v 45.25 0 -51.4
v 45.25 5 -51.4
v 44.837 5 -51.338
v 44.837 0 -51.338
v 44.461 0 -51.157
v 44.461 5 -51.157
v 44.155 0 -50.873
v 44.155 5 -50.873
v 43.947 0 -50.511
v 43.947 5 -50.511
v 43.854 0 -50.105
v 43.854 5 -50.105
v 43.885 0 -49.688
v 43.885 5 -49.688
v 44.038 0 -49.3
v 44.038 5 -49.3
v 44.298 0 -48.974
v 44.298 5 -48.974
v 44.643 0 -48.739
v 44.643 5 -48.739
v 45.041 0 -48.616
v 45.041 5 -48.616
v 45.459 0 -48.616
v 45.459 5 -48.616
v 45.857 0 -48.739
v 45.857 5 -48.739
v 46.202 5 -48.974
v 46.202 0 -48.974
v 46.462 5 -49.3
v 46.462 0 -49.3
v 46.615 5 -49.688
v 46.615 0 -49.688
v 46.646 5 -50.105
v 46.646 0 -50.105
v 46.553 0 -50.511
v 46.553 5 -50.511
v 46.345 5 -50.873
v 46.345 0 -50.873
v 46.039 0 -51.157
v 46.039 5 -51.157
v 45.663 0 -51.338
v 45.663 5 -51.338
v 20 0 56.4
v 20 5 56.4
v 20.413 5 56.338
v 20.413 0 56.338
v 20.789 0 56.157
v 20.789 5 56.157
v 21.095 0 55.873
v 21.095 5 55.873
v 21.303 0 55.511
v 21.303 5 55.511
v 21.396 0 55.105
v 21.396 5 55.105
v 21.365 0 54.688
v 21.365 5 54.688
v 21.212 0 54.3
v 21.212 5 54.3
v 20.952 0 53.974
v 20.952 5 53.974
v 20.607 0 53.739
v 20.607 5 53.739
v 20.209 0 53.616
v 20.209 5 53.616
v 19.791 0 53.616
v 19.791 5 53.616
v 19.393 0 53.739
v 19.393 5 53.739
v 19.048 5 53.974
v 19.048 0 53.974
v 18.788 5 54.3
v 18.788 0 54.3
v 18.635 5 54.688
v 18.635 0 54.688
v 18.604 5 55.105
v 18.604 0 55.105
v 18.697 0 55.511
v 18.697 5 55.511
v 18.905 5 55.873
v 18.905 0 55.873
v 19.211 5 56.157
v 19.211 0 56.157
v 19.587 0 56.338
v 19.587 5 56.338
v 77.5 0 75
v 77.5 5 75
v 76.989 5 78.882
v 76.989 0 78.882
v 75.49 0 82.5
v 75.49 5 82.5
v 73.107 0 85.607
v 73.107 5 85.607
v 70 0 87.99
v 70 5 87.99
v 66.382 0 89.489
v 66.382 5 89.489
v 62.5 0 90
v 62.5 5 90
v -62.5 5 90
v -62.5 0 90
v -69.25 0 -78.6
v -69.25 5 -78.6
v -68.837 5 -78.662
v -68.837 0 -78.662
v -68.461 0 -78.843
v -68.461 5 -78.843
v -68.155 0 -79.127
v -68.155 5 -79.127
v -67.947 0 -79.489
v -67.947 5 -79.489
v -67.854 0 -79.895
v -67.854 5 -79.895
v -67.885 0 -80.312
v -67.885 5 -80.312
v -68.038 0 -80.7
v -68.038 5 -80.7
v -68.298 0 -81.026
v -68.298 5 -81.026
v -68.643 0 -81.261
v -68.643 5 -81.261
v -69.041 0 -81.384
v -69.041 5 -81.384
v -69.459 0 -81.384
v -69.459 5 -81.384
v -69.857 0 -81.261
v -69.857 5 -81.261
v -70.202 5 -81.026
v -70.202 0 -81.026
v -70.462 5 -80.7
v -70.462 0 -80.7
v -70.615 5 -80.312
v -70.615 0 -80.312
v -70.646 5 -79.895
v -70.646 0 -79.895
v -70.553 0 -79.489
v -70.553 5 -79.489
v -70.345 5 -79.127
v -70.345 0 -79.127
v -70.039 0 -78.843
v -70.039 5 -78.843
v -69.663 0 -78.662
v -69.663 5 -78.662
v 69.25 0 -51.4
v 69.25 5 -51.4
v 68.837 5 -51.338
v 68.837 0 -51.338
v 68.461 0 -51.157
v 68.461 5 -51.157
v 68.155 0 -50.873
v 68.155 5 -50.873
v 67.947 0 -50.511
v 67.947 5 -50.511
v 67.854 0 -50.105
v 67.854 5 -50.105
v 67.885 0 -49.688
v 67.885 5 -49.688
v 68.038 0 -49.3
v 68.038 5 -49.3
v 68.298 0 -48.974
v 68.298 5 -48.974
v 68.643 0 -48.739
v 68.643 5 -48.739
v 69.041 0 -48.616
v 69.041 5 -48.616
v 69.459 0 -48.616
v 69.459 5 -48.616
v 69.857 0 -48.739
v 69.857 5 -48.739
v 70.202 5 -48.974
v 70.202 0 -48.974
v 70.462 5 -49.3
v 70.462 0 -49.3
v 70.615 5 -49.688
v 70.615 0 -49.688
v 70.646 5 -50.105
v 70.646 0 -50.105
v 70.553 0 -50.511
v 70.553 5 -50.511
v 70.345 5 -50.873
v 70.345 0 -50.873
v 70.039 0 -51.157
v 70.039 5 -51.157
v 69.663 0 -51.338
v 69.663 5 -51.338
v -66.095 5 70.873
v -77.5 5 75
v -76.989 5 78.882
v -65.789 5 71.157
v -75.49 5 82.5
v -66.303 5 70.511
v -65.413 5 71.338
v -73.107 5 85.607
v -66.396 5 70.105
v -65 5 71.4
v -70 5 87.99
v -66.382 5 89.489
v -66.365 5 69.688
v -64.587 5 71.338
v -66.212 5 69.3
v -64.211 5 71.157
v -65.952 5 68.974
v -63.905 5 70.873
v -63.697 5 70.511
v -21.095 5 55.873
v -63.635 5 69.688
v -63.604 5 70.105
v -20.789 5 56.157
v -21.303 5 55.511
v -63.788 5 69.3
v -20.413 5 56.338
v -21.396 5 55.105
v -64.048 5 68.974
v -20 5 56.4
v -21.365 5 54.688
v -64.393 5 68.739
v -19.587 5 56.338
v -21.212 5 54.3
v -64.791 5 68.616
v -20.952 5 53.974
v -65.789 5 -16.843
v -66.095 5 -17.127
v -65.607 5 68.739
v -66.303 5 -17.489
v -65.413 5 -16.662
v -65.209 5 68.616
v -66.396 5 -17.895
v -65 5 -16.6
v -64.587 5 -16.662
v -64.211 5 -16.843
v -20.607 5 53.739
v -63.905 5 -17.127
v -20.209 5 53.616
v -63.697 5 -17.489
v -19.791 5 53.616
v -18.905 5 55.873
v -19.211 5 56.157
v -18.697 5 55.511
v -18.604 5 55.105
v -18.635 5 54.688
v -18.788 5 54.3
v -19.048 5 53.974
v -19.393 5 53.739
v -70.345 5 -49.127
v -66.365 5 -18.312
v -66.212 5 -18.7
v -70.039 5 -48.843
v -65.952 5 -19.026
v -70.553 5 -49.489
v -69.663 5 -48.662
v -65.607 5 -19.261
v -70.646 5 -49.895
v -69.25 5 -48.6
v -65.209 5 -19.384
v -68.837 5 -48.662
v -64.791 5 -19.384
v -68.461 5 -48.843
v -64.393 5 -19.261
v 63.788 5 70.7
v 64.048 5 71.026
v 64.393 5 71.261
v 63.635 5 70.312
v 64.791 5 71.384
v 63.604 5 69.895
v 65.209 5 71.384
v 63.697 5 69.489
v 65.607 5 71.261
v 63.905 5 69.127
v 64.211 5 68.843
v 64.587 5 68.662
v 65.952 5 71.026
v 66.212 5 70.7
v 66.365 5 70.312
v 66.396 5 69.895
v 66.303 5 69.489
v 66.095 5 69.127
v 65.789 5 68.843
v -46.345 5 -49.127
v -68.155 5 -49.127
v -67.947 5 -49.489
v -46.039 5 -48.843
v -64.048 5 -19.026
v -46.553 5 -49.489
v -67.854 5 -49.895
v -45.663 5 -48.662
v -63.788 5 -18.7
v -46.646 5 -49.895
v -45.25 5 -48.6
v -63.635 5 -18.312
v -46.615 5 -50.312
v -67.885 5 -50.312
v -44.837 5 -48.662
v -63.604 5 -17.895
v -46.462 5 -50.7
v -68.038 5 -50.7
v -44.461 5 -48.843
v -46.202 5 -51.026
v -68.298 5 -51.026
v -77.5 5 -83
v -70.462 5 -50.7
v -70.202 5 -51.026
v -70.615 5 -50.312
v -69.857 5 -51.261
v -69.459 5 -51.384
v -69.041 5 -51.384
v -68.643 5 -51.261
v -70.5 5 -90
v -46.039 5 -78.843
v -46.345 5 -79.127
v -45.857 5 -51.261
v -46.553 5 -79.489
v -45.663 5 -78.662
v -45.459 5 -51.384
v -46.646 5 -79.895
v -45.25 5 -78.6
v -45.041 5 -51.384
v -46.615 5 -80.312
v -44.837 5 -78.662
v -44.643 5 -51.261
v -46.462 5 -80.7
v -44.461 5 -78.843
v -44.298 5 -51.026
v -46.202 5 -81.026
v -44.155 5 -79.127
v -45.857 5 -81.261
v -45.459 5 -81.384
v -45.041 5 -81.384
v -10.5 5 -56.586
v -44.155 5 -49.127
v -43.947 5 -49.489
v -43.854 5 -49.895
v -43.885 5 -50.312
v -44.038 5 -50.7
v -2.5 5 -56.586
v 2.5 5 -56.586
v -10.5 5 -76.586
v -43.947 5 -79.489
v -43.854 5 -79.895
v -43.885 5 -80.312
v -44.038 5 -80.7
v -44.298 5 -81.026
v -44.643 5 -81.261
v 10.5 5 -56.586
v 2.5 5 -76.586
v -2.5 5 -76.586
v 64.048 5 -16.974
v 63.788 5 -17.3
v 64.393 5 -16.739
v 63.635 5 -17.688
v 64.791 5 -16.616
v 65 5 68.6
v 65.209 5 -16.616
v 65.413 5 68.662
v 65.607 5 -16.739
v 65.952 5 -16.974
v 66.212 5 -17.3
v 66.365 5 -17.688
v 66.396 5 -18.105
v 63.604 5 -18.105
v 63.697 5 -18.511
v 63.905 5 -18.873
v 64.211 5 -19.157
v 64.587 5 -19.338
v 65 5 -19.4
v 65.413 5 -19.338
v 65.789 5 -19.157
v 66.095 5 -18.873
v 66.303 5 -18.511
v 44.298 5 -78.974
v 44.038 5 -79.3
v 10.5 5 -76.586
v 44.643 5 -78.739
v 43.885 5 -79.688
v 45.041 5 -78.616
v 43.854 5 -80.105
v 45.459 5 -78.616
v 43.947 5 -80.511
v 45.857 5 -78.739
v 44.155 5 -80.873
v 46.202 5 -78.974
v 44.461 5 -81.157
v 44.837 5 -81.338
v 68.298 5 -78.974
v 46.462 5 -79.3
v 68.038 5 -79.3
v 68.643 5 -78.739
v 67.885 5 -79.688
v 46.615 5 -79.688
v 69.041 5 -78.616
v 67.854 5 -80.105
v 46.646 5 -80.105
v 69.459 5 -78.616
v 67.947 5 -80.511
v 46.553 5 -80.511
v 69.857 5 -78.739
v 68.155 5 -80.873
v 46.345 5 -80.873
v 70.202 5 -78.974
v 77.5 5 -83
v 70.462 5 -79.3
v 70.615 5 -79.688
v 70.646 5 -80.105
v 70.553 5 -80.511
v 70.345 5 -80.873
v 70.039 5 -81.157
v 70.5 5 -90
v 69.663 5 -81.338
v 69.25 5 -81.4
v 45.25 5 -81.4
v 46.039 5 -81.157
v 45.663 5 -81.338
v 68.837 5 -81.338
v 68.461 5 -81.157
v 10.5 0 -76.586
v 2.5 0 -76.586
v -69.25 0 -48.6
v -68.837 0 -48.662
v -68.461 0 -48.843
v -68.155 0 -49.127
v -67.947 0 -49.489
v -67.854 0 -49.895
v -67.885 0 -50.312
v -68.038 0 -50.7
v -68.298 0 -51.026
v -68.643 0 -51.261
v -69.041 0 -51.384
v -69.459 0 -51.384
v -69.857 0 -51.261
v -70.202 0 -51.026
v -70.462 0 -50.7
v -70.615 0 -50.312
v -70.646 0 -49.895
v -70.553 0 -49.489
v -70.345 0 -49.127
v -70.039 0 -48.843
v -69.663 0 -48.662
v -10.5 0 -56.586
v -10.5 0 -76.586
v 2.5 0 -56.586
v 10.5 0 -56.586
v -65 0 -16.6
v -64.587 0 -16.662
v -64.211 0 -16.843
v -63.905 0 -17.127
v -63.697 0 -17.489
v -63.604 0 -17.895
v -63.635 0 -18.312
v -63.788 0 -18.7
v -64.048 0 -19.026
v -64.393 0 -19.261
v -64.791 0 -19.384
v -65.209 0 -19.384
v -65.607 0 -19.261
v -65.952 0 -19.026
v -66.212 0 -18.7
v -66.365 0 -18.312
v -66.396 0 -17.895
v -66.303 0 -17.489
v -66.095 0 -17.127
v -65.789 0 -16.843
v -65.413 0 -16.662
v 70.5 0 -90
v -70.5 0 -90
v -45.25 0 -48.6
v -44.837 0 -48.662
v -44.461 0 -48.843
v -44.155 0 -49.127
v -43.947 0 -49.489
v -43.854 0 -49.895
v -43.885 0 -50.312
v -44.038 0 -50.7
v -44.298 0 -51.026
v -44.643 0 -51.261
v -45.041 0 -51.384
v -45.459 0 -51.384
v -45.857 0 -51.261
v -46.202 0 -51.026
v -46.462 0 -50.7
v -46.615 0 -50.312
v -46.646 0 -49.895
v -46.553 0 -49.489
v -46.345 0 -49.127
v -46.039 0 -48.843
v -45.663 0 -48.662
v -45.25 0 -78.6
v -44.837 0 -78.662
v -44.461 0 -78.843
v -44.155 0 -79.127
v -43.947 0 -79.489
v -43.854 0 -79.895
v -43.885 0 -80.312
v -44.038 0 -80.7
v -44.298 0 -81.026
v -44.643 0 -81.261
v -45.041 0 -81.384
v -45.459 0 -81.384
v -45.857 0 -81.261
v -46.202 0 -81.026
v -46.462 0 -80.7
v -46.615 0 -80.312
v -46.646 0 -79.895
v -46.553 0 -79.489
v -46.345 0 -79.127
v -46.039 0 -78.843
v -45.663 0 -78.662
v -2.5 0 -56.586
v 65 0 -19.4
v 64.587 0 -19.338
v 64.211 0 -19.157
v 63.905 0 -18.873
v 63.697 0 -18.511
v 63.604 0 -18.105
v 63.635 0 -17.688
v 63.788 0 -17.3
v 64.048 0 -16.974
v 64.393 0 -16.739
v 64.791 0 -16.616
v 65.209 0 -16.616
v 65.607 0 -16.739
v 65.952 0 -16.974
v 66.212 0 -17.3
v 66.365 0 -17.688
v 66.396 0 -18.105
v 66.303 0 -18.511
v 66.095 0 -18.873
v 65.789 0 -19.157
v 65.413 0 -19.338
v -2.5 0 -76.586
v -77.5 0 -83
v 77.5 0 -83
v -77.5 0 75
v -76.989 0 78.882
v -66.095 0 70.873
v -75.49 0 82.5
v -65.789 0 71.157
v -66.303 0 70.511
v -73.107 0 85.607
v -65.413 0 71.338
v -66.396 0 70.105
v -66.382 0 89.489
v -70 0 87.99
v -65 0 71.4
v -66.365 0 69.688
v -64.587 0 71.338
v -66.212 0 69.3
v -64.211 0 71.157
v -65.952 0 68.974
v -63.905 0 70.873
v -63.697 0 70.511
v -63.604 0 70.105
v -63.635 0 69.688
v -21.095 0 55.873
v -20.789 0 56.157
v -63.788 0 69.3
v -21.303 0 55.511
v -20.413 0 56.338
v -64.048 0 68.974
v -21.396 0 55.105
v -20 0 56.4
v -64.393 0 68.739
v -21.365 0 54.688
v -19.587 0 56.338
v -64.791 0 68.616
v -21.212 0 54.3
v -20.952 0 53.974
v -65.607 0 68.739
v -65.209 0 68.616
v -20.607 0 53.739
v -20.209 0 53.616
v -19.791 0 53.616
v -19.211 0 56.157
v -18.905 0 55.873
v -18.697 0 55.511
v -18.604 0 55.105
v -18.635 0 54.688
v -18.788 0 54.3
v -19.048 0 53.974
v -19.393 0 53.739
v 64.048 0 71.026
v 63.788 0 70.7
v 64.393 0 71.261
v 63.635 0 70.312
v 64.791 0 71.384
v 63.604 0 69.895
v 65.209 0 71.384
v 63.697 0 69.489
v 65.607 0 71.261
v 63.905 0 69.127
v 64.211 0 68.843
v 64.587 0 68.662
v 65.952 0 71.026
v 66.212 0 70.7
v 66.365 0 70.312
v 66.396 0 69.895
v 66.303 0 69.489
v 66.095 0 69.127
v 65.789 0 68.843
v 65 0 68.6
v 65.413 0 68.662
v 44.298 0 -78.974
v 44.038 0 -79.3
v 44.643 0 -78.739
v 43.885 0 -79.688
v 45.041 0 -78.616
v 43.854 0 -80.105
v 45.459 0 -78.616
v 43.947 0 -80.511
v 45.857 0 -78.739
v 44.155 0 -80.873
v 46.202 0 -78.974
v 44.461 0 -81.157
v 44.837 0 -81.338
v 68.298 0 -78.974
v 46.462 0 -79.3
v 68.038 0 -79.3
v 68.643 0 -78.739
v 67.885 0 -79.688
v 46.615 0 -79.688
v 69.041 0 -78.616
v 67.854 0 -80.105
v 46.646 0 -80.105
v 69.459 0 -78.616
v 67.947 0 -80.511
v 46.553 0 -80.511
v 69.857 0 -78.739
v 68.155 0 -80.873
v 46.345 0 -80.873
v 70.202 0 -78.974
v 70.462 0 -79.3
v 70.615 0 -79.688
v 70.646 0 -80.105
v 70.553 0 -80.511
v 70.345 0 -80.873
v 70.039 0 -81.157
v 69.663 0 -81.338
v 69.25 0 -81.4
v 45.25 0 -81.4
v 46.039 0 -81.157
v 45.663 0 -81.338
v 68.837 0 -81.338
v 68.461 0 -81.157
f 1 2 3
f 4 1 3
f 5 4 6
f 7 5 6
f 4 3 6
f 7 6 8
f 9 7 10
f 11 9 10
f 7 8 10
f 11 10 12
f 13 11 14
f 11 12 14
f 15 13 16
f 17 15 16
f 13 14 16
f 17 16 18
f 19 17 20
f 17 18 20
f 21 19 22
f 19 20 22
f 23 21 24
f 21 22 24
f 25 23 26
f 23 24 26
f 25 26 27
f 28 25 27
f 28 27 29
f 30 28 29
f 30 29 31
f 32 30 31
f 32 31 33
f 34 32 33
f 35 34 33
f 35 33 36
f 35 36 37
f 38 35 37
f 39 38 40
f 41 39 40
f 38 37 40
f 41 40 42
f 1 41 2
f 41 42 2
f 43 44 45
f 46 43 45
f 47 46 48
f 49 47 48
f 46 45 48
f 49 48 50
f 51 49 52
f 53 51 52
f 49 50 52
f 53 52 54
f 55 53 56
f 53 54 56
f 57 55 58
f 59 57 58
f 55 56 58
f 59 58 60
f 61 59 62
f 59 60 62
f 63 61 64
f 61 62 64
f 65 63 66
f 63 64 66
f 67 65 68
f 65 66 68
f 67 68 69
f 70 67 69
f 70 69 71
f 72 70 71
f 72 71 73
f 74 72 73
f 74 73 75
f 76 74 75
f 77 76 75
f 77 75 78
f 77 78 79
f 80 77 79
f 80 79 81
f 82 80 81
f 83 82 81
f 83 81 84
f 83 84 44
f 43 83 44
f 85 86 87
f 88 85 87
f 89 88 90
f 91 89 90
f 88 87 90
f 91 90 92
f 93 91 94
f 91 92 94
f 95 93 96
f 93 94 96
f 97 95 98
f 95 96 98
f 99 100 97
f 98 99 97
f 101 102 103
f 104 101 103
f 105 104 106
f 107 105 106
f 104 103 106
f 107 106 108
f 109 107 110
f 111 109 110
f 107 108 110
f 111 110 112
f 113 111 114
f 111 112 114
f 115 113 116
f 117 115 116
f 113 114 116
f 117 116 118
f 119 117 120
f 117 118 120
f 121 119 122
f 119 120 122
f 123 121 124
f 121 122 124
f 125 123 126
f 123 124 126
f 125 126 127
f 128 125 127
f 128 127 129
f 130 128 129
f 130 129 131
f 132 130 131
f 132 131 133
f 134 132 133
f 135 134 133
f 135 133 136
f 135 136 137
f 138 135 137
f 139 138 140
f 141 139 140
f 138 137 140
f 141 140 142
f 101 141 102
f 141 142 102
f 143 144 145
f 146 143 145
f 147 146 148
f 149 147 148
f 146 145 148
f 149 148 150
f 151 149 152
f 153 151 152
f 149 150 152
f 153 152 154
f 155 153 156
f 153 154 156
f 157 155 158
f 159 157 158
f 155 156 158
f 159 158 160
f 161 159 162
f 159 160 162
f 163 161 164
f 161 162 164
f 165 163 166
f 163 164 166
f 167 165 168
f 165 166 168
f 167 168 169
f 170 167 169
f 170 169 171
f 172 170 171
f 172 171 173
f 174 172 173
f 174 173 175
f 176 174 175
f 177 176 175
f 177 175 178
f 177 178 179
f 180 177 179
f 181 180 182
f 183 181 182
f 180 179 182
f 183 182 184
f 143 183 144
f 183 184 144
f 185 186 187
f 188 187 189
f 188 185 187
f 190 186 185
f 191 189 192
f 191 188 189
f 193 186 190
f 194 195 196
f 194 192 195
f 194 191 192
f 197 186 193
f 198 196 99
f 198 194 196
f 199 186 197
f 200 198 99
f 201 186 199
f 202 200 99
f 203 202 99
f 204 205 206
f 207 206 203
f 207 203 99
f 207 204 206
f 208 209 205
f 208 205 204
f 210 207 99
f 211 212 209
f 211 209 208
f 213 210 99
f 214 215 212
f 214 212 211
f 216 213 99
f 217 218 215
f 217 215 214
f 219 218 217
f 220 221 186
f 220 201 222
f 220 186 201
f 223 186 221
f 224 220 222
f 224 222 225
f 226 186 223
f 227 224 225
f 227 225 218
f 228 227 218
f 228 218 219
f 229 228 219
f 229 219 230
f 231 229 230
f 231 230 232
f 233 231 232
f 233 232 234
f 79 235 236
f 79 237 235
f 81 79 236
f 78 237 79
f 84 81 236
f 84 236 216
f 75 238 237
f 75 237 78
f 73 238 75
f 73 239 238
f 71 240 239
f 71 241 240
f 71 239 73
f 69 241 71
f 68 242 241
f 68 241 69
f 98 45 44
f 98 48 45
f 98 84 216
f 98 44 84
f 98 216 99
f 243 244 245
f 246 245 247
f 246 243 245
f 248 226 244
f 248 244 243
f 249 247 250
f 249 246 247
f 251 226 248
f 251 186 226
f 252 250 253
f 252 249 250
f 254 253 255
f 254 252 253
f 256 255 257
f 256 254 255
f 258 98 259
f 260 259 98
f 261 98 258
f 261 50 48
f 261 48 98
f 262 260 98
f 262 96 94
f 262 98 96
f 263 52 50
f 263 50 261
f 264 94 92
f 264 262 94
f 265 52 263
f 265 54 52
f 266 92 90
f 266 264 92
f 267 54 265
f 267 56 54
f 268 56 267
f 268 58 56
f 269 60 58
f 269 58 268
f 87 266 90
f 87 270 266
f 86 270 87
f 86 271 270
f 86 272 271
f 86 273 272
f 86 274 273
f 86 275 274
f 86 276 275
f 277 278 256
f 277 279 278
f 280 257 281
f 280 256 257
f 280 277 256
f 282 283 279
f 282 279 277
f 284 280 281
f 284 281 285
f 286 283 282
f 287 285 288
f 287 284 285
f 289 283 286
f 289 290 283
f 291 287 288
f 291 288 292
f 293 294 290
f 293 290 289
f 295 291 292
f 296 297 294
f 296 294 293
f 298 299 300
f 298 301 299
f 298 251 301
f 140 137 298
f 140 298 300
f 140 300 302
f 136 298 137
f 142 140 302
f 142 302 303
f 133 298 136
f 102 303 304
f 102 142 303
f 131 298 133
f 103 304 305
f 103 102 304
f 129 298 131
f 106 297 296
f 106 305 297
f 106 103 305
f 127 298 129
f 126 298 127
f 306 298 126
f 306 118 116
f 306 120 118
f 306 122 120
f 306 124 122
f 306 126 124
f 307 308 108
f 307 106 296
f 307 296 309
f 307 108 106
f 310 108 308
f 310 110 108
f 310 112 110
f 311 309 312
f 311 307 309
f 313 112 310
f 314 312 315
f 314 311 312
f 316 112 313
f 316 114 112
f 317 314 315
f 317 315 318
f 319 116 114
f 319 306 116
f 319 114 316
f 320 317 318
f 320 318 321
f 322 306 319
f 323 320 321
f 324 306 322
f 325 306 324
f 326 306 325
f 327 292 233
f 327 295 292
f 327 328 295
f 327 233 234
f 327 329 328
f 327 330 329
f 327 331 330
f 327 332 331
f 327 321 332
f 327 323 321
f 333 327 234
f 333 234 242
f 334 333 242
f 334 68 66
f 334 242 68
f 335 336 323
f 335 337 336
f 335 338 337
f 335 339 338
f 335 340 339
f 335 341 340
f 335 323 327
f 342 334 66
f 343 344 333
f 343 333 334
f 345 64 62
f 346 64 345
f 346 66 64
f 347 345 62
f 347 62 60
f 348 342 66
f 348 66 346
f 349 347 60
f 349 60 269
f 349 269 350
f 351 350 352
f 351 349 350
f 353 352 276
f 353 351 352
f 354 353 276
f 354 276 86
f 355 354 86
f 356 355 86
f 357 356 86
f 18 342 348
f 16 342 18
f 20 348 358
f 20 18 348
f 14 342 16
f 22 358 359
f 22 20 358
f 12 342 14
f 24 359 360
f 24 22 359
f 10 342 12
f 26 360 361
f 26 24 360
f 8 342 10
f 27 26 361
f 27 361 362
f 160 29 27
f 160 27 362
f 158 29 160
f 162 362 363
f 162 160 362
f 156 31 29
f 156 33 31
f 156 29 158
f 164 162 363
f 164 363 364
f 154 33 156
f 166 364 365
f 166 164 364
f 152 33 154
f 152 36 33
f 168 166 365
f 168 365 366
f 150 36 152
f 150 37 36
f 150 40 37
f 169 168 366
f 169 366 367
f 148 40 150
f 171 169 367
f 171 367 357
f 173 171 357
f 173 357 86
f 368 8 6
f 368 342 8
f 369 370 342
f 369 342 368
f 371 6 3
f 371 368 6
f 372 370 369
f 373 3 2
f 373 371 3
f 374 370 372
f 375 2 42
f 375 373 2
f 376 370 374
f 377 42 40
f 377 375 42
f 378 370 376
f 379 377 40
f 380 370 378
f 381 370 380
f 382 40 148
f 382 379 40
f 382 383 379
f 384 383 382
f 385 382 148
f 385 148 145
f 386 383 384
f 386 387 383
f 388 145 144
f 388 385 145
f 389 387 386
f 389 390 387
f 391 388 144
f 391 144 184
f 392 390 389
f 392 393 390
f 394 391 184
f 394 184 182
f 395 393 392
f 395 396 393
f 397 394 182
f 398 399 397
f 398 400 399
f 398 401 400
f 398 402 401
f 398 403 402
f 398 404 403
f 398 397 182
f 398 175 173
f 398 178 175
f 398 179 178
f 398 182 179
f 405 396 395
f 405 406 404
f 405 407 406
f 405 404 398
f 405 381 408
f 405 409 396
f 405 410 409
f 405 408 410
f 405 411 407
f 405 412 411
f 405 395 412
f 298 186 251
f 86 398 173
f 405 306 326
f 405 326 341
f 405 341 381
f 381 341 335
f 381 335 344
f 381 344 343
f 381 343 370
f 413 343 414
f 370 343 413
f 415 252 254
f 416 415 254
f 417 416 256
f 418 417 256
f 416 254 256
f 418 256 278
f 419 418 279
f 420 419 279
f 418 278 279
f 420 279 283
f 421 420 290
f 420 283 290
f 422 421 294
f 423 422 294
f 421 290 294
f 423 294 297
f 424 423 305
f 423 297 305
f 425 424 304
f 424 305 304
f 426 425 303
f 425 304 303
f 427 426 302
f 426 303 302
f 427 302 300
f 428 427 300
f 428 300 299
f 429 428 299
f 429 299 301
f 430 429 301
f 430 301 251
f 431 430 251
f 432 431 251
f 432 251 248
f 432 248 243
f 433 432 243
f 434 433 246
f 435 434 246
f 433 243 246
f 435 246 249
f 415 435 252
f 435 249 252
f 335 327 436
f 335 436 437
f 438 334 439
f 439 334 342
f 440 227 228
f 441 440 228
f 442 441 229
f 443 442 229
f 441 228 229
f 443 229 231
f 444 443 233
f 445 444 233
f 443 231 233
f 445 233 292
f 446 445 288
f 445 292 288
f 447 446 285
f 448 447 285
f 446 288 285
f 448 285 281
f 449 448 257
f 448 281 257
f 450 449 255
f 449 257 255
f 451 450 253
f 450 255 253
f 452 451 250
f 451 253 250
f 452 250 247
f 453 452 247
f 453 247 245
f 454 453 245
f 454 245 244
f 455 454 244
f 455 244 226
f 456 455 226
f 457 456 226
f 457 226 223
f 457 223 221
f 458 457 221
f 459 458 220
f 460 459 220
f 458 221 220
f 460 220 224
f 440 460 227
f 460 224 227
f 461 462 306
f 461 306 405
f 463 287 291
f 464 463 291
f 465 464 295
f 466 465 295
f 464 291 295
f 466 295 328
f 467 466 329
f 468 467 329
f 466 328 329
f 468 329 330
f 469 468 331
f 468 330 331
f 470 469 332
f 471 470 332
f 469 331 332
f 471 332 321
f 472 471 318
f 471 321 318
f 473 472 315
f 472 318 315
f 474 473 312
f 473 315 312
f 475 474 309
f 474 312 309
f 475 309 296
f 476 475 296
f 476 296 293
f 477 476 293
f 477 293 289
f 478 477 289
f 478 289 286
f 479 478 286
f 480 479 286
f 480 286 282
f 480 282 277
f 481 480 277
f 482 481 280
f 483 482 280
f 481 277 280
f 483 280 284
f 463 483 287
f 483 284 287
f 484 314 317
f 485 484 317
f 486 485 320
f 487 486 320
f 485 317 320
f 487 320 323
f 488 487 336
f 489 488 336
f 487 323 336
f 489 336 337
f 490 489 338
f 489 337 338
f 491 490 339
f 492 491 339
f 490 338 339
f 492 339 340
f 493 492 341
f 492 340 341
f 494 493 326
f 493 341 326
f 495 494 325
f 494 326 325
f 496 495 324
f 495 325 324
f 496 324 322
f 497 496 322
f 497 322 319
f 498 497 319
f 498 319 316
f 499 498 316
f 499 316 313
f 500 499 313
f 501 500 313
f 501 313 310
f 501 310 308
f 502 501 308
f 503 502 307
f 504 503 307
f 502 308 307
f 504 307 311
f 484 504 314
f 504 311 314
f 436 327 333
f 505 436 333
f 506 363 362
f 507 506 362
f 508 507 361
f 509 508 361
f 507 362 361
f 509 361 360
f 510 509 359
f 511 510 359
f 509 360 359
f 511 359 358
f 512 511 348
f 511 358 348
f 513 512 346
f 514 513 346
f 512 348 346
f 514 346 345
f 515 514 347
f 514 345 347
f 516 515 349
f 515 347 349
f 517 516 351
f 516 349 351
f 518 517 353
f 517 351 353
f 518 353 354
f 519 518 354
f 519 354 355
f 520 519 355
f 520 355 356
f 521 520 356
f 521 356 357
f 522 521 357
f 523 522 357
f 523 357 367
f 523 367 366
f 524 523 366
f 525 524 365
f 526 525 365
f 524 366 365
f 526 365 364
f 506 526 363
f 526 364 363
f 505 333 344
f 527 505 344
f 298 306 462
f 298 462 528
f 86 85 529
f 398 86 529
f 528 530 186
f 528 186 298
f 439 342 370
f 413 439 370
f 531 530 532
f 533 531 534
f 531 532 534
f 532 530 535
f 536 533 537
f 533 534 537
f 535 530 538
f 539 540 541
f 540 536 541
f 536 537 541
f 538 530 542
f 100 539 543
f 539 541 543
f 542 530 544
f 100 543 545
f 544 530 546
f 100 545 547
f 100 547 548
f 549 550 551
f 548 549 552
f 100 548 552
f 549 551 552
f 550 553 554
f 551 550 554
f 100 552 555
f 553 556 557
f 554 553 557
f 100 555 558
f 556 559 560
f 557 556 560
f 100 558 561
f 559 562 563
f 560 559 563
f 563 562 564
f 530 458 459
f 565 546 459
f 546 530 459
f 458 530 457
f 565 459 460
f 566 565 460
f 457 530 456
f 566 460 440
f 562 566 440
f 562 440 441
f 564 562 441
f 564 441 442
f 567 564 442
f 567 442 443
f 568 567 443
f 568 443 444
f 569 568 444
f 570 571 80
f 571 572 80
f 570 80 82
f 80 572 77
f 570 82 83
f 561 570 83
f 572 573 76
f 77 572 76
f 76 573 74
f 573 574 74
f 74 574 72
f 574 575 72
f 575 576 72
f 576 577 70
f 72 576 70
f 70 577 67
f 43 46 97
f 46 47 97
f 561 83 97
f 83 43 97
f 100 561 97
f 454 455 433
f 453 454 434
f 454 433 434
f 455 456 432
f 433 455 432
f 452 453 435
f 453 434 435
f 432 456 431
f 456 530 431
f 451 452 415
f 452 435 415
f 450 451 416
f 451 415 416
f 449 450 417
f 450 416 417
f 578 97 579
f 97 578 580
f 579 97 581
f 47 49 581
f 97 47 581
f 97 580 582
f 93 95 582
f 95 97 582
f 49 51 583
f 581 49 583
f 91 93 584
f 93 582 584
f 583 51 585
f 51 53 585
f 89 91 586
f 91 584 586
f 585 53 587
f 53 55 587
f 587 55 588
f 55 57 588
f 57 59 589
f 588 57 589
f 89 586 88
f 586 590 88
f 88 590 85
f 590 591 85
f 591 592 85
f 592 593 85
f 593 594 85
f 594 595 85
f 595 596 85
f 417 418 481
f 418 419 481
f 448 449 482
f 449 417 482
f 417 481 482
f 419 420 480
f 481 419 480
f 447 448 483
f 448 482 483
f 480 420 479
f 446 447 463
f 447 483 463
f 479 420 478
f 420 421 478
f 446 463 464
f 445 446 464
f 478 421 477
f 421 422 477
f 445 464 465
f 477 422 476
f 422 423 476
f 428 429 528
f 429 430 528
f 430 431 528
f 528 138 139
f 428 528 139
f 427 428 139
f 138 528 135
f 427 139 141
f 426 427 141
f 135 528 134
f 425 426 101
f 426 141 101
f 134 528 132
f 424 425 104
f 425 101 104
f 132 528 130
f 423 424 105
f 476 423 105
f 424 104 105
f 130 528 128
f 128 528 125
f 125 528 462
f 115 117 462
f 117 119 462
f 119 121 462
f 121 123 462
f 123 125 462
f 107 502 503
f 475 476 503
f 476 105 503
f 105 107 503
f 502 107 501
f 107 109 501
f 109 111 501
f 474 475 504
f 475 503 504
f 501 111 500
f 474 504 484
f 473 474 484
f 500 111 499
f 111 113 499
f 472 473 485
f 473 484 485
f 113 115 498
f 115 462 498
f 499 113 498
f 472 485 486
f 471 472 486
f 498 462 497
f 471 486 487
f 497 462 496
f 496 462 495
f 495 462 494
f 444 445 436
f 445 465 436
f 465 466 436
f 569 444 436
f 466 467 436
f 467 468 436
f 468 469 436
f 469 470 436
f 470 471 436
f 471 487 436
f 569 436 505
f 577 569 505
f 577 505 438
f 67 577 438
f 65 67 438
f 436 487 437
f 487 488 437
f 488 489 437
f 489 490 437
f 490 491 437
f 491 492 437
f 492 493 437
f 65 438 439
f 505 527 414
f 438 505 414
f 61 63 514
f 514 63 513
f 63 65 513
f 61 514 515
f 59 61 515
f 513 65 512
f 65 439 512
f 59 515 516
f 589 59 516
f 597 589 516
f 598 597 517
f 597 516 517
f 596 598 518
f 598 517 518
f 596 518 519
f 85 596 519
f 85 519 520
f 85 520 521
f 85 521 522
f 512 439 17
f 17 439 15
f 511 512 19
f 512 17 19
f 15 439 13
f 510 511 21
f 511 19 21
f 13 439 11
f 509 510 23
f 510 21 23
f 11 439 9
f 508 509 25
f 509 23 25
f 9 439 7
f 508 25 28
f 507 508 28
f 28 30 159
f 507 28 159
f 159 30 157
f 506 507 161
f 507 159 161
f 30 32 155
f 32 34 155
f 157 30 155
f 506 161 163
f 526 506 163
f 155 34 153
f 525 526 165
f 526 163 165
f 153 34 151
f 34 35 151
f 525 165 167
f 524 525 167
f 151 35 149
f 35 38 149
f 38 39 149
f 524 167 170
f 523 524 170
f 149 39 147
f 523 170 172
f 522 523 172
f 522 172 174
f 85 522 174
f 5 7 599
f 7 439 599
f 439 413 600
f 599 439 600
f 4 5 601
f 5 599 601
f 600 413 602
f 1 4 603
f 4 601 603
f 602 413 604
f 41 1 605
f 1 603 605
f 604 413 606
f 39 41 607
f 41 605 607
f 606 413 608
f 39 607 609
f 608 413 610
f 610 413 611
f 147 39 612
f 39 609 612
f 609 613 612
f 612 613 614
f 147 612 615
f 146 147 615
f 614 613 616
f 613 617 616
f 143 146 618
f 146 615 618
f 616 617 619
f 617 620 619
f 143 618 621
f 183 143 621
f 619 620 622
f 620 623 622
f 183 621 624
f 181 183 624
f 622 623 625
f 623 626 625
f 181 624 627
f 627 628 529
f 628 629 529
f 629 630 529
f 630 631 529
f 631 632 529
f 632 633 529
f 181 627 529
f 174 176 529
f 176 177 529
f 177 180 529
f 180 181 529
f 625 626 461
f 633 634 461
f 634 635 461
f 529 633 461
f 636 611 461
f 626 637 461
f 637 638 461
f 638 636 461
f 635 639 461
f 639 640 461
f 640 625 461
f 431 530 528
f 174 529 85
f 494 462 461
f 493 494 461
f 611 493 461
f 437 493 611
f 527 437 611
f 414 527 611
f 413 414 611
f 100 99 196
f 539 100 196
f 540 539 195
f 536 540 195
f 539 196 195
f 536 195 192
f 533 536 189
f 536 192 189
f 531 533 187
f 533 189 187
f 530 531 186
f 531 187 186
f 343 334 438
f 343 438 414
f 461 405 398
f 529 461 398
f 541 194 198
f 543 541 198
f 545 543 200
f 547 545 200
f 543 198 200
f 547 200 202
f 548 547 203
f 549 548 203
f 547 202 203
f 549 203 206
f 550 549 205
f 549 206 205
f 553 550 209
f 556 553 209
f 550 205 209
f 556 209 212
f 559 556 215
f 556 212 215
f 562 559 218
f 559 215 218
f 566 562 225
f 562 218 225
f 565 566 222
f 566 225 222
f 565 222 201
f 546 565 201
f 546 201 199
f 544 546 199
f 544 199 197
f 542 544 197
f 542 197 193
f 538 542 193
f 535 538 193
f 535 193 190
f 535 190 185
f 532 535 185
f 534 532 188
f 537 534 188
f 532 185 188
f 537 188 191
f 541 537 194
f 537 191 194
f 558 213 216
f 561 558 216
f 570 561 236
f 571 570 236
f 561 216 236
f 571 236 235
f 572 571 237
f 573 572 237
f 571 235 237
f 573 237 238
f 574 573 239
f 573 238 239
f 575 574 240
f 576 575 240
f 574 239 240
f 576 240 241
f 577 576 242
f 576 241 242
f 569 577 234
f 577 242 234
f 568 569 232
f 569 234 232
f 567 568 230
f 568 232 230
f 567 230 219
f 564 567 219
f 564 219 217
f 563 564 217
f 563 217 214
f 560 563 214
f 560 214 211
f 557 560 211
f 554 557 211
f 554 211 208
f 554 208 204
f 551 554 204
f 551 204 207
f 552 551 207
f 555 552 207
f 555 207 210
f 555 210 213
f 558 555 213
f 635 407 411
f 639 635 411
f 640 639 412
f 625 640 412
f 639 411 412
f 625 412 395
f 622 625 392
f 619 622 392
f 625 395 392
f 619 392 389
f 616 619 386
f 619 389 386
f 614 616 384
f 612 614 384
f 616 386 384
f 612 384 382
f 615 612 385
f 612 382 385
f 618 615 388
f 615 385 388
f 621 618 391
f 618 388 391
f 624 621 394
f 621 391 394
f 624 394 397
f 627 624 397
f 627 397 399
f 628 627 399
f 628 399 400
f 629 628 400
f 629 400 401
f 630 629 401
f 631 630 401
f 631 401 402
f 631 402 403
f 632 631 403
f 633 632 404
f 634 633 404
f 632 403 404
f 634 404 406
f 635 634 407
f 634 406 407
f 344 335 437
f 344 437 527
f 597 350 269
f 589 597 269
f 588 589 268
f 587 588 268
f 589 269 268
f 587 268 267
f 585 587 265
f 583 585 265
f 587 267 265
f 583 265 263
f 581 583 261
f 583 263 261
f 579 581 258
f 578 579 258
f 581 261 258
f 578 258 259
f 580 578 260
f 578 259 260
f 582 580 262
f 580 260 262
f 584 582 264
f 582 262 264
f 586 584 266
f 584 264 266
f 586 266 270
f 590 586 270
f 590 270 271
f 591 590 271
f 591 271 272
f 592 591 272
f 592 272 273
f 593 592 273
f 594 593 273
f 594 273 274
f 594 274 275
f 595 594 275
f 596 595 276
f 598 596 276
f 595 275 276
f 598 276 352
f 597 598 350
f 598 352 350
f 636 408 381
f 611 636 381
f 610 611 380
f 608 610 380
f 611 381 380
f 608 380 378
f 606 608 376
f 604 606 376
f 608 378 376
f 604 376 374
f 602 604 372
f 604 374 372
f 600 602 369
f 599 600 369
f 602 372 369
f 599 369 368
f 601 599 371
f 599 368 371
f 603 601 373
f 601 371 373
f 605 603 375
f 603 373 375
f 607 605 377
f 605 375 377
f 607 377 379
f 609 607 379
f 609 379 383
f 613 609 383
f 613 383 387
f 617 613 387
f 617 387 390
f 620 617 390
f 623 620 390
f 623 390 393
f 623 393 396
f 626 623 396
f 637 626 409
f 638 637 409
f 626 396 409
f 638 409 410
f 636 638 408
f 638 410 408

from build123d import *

# Parameters (mm, degrees)
SKETCH7_W           = 155
SKETCH7_H           = 180
BOSS_EXTRUDE2_DEPTH = 5
SKETCH8_R           = 1.4
CUT_EXTRUDE3_DEPTH  = 5
SKETCH9_R           = 1.4
CUT_EXTRUDE4_DEPTH  = 5
CUT_EXTRUDE5_DEPTH  = 5
SKETCH11_W          = 8
SKETCH11_H          = 20
CUT_EXTRUDE6_DEPTH  = 5
CUT_EXTRUDE7_DEPTH  = 5
SKETCH15_R          = 1.4
CUT_EXTRUDE8_DEPTH  = 10


with BuildPart() as part:
    # Sketch7 → Boss-Extrude2 (new body)
    with BuildSketch(Plane(origin=(0, 0, 0), x_dir=(1, 0, 0), z_dir=(0, 1, 0))):
        Rectangle(SKETCH7_W, SKETCH7_H)
    extrude(amount=BOSS_EXTRUDE2_DEPTH)

    # Sketch8 → Cut-Extrude3 (cut)
    with BuildSketch(Plane(origin=(0, 5, 0), x_dir=(1, 0, 0), z_dir=(0, 1, 0))):
        with Locations(Location((-69.25, 80, 0), (0, 0, 270))):
            Circle(SKETCH8_R)
        with Locations(Location((-69.25, 50, 0), (0, 0, 270))):
            Circle(SKETCH8_R)
        with Locations(Location((-45.25, 50, 0), (0, 0, 270))):
            Circle(SKETCH8_R)
        with Locations(Location((-45.25, 80, 0), (0, 0, 270))):
            Circle(SKETCH8_R)
        with Locations(Location((45.25, 80, 0), (0, 0, 90))):
            Circle(SKETCH8_R)
        with Locations(Location((45.25, 50, 0), (0, 0, 90))):
            Circle(SKETCH8_R)
        with Locations(Location((69.25, 50, 0), (0, 0, 90))):
            Circle(SKETCH8_R)
        with Locations(Location((69.25, 80, 0), (0, 0, 90))):
            Circle(SKETCH8_R)
    extrude(amount=-CUT_EXTRUDE3_DEPTH, mode=Mode.SUBTRACT)

    # Sketch9 → Cut-Extrude4 (cut)
    with BuildSketch(Plane(origin=(0, 5, 0), x_dir=(1, 0, 0), z_dir=(0, 1, 0))):
        with Locations(Location((-65, 18, 0), (0, 0, 270))):
            Circle(SKETCH9_R)
        with Locations(Location((65, 18, 0), (0, 0, 90))):
            Circle(SKETCH9_R)
        with Locations(Location((-65, -70, 0), (0, 0, 270))):
            Circle(SKETCH9_R)
        with Locations(Location((65, -70, 0), (0, 0, 90))):
            Circle(SKETCH9_R)
    extrude(amount=-CUT_EXTRUDE4_DEPTH, mode=Mode.SUBTRACT)

    # Sketch10 → Cut-Extrude5 (cut)
    with BuildSketch(Plane(origin=(0, 5, 0), x_dir=(1, 0, 0), z_dir=(0, 1, 0))):
        with BuildLine():
            Line((-77.5, -90), (-62.5, -90))
            ThreePointArc((-62.5, -90), (-73.106601718, -85.606601718), (-77.5, -75))
            Line((-77.5, -75), (-77.5, -90))
        make_face()
        with BuildLine():
            Line((77.5, -90), (77.5, -75))
            ThreePointArc((77.5, -75), (73.106601718, -85.606601718), (62.5, -90))
            Line((62.5, -90), (77.5, -90))
        make_face()
    extrude(amount=-CUT_EXTRUDE5_DEPTH, mode=Mode.SUBTRACT)

    # Sketch11 → Cut-Extrude6 (cut)
    with BuildSketch(Plane(origin=(0, 5, 0), x_dir=(1, 0, 0), z_dir=(0, 1, 0))):
        with Locations((6.5, 66.58550083)):
            Rectangle(SKETCH11_W, SKETCH11_H)
        with Locations((-6.5, 66.58550083)):
            Rectangle(SKETCH11_W, SKETCH11_H)
    extrude(amount=-CUT_EXTRUDE6_DEPTH, mode=Mode.SUBTRACT)

    # Sketch13 → Cut-Extrude7 (cut)
    with BuildSketch(Plane(origin=(0, 5, 0), x_dir=(1, 0, 0), z_dir=(0, 1, 0))):
        Polygon((-70.5, 90), (-77.5, 83), (-77.5, 90), align=None)
        Polygon((70.5, 90), (77.5, 83), (77.5, 90), align=None)
    extrude(amount=-CUT_EXTRUDE7_DEPTH, mode=Mode.SUBTRACT)

    # Sketch15 → Cut-Extrude8 (cut)
    with BuildSketch(Plane(origin=(0, 5, 0), x_dir=(1, 0, 0), z_dir=(0, 1, 0))):
        with Locations(Location((-20, -55, 0), (0, 0, 270))):
            Circle(SKETCH15_R)
        with Locations(Location((20, -55, 0), (0, 0, 270))):
            Circle(SKETCH15_R)
    extrude(amount=-CUT_EXTRUDE8_DEPTH, mode=Mode.SUBTRACT)


solid = part.part
